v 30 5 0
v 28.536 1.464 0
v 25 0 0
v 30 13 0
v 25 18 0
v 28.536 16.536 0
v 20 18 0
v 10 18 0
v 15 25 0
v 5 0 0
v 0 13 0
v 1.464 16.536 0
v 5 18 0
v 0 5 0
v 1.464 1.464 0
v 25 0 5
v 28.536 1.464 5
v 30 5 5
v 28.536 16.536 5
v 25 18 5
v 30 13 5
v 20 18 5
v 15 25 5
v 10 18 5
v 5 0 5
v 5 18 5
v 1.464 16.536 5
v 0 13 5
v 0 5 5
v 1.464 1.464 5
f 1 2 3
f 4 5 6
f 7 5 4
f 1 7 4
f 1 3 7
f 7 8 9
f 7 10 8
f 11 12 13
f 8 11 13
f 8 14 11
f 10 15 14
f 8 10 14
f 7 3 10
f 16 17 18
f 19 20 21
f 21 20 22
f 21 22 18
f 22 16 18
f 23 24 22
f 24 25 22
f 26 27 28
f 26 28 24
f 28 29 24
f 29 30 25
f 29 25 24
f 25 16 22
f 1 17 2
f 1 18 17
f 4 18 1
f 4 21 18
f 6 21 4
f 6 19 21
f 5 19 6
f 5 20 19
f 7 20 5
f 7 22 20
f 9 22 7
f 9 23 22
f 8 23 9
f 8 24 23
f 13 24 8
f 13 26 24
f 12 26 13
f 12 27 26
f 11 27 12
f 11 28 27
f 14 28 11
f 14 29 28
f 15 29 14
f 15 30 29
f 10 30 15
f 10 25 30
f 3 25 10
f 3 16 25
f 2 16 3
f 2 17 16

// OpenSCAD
$fn = 32;

// ----------------------------------------------------------------------
// Ratchet pawl: 30 x 18 mm body, beak 7 mm сверху
// ----------------------------------------------------------------------

// --- parameters (mm) ---
profile_height = 5;       // extrusion height
profile_points = 15;      // points of the closed outline

profile = [[0, 5], [1.464, 1.464], [5, 0], [25, 0], [28.536, 1.464], [30, 5], [30, 13], [28.536, 16.536], [25, 18], [20, 18], [15, 25], [10, 18], [5, 18], [1.464, 16.536], [0, 13]];  // single closed polygon, 15 points, counter clockwise

// --- the one profile operation ---
linear_extrude(height = profile_height) polygon(points = profile);
